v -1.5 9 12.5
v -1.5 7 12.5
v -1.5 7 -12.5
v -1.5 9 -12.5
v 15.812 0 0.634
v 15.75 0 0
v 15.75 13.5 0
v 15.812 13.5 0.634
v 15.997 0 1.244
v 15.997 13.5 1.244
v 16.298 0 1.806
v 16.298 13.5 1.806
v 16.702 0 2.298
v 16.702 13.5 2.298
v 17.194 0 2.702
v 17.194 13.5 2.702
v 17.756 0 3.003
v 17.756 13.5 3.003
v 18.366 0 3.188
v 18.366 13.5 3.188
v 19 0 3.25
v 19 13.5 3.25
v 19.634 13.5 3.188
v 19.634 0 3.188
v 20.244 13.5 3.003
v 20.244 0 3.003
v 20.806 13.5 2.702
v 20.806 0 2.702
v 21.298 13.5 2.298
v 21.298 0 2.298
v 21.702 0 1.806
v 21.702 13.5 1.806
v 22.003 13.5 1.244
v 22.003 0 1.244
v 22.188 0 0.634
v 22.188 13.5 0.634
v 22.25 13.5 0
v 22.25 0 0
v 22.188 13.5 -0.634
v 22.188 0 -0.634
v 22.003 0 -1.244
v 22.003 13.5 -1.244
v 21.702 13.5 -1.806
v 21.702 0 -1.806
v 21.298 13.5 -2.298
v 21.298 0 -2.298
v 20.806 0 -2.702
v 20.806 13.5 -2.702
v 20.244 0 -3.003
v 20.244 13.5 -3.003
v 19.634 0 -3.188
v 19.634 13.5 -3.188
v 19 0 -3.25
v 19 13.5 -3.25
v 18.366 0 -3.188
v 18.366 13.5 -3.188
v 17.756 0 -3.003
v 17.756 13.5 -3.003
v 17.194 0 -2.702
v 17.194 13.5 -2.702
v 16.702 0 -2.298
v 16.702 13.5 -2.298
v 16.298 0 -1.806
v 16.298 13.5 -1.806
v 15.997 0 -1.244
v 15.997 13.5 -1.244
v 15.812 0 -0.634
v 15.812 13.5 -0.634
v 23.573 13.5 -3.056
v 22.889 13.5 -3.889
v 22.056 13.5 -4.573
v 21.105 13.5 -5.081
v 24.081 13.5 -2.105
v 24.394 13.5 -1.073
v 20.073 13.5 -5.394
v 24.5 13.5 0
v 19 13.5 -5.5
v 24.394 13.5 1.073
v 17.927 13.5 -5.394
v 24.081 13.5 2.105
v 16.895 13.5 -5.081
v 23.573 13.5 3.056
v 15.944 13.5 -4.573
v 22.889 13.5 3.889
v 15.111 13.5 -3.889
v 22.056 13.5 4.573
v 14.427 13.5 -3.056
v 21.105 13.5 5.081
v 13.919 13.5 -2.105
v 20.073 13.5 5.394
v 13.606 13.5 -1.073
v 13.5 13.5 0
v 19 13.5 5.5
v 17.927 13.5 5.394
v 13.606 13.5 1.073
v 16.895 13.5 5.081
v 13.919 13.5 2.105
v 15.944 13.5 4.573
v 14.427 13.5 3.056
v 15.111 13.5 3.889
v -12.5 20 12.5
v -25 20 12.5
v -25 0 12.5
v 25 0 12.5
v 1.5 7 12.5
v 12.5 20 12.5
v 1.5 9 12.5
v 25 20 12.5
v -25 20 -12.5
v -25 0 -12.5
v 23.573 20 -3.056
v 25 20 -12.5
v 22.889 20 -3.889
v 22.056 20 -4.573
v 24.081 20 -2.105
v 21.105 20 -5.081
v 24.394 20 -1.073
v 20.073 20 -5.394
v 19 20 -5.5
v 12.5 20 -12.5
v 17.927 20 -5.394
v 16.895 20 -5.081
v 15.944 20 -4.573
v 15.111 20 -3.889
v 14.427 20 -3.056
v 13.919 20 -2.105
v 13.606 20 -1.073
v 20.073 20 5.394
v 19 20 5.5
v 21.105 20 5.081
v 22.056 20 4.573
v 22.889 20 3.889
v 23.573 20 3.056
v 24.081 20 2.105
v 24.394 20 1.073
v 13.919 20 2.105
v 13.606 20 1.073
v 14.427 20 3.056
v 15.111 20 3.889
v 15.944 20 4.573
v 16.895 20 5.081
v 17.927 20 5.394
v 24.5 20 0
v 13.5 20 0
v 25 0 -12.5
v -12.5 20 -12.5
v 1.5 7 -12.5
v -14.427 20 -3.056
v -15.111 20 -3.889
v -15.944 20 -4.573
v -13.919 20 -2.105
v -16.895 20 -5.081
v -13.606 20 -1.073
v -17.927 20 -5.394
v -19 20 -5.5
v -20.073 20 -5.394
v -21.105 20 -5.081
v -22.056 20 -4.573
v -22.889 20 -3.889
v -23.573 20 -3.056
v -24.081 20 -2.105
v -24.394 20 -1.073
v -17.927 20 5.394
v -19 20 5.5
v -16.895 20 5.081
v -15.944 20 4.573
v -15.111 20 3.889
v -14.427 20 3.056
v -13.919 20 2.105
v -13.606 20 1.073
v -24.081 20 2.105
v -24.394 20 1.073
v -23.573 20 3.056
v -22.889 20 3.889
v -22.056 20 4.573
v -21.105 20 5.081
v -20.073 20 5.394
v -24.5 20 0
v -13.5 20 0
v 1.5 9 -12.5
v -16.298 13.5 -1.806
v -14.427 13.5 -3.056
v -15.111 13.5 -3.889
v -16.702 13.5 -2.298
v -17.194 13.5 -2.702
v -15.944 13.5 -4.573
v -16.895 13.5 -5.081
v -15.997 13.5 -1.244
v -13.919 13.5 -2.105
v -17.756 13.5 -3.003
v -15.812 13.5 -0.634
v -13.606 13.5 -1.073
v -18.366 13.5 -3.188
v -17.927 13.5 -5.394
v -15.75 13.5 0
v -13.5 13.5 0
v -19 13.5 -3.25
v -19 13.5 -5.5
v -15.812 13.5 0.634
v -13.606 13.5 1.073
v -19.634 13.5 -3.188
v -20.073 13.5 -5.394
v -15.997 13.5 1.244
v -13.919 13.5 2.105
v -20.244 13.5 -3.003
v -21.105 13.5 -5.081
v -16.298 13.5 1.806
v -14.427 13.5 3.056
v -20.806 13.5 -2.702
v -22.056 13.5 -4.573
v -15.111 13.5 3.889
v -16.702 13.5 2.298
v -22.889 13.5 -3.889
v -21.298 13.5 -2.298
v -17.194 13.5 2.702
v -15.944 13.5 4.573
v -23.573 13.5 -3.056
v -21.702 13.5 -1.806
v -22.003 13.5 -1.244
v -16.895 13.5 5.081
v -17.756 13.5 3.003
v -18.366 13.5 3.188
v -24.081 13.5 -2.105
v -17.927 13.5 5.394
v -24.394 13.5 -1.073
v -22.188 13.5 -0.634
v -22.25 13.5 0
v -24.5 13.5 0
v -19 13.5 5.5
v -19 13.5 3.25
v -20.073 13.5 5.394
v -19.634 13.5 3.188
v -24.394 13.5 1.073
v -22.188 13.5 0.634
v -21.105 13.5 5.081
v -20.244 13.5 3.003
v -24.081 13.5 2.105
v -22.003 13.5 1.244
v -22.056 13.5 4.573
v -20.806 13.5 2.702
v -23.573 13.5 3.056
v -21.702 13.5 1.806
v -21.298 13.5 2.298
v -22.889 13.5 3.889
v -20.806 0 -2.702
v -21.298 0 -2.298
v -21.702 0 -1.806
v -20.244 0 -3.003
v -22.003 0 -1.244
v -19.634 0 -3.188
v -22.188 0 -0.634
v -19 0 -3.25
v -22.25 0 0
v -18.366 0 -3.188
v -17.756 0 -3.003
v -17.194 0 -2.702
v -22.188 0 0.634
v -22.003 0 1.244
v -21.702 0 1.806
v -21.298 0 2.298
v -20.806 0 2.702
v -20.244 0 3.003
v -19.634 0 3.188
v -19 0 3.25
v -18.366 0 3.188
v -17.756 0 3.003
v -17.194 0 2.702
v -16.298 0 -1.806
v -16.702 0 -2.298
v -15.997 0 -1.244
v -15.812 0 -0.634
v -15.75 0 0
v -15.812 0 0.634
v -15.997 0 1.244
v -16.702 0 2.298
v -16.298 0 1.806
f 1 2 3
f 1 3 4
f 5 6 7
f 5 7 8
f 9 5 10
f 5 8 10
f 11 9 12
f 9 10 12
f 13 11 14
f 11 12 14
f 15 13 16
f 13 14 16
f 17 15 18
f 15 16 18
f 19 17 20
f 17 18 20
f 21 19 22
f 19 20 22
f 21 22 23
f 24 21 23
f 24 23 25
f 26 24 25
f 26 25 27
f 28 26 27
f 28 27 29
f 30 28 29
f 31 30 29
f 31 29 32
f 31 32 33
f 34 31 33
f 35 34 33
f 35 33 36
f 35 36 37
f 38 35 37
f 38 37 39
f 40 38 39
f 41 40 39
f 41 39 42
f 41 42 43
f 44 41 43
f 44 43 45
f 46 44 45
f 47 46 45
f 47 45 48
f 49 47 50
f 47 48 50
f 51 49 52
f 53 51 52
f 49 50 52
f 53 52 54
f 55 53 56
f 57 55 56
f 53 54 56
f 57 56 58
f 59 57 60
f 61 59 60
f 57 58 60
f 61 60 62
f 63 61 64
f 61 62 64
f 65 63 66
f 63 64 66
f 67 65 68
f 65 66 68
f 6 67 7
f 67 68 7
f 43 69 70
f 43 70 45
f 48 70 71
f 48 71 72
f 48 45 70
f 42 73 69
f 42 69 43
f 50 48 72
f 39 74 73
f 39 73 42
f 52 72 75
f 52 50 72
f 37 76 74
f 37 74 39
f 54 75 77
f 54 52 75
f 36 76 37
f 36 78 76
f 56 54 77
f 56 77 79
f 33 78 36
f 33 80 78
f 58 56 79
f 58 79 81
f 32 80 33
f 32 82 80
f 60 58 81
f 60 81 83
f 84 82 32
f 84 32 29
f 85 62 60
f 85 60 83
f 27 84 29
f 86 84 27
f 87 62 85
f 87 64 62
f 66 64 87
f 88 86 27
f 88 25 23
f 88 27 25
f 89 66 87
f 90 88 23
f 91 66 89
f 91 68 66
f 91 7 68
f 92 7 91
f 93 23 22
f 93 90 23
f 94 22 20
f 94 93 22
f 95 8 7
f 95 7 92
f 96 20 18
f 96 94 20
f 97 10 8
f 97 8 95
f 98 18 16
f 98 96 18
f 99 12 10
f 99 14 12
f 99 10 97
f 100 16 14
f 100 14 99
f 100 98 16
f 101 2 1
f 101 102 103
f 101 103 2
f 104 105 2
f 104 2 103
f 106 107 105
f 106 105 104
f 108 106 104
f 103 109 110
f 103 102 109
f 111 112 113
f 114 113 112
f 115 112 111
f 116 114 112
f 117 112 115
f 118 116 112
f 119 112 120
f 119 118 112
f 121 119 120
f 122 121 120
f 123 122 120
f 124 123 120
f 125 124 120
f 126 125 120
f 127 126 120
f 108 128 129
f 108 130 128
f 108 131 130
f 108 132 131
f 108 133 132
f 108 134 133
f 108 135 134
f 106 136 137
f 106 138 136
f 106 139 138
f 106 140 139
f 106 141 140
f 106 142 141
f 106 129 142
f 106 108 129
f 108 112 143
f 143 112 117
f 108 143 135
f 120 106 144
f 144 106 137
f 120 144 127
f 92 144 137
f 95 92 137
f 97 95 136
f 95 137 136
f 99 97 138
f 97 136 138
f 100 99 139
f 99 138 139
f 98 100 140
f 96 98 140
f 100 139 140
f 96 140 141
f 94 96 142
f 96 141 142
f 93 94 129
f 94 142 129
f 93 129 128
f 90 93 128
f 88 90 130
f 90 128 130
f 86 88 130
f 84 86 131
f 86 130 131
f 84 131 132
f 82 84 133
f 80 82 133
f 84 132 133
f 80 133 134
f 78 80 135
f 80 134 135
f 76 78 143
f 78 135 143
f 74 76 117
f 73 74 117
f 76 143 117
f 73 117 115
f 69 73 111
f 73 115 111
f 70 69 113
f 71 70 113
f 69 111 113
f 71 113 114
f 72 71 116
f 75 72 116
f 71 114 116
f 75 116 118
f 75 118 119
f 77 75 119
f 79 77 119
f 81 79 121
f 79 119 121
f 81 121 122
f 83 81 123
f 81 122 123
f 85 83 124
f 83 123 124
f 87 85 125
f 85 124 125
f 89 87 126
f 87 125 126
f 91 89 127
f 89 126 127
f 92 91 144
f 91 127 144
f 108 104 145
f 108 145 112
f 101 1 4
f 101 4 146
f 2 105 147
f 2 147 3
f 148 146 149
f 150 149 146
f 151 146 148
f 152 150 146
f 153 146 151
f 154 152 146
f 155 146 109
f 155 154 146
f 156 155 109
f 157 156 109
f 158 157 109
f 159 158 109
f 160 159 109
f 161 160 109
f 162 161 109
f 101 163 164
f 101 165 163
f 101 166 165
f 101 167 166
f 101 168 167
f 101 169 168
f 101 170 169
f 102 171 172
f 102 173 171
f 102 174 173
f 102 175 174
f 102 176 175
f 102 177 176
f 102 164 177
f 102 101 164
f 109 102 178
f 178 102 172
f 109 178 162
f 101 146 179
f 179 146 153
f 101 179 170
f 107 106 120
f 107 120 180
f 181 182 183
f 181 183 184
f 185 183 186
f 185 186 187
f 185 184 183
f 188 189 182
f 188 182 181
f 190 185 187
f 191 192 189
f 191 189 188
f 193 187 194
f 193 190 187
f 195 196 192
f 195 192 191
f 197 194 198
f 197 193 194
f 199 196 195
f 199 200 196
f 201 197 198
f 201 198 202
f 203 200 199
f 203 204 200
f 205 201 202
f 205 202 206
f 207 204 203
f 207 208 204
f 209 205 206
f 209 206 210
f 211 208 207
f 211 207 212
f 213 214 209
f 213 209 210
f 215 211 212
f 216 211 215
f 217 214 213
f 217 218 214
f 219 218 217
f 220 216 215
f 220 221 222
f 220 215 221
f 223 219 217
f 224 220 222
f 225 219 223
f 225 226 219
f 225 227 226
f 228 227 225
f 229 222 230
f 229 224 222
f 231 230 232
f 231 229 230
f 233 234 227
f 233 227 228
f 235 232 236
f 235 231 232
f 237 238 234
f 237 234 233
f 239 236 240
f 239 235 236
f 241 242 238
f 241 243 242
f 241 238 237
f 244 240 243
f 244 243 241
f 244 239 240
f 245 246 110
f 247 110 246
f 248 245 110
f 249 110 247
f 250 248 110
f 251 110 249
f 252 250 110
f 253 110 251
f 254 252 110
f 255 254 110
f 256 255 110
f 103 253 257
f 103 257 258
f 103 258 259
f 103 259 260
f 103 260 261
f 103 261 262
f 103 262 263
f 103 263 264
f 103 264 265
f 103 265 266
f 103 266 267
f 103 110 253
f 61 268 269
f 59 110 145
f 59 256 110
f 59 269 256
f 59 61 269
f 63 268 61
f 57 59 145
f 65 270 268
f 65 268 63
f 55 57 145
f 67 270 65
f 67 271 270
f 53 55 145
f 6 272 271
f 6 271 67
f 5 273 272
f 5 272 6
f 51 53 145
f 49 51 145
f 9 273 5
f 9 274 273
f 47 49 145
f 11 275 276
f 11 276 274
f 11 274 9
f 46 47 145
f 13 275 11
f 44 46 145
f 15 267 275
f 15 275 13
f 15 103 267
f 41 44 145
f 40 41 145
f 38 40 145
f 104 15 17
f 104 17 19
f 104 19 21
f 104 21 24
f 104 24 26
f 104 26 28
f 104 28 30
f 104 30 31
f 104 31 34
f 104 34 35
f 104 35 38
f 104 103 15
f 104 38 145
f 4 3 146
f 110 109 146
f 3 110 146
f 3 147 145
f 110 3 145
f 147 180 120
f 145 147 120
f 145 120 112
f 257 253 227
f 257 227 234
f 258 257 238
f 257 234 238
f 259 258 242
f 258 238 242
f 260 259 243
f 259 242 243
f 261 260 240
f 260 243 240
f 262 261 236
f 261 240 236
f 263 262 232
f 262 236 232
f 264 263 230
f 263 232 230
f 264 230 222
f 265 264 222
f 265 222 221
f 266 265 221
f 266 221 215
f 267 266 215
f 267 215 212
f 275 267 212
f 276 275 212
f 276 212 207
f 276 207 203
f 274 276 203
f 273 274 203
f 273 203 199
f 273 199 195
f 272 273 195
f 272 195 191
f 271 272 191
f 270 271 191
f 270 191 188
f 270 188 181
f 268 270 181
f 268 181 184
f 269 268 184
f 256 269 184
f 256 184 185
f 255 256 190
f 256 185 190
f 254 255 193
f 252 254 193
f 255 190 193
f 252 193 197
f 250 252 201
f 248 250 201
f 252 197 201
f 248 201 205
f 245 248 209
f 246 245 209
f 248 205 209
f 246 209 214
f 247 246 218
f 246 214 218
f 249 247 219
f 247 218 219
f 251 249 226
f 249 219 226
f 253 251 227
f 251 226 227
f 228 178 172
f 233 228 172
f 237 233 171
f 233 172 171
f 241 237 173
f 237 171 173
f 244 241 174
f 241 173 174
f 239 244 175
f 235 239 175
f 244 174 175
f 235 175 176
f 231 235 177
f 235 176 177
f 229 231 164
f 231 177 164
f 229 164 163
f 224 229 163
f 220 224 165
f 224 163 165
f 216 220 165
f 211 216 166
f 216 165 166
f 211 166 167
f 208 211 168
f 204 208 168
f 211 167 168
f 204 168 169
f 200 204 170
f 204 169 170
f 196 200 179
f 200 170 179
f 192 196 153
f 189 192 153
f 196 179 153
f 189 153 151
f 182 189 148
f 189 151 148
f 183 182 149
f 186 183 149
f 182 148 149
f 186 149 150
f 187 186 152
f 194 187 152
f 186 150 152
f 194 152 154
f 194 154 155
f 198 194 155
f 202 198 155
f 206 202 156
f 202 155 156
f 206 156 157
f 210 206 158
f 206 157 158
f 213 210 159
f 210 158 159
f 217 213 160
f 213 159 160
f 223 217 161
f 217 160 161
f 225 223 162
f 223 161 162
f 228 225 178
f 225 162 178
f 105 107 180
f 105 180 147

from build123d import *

# Parameters (mm, degrees)
BOSS_EXTRUDE1_DEPTH      = 12.5
BOSS_EXTRUDE1_DEPTH_BACK = 12.5
SKETCH2_R                = 3.25
CUT_EXTRUDE1_DEPTH       = 35.369317712
SKETCH3_R                = 5.5
CUT_EXTRUDE2_DEPTH       = 6.5


with BuildPart() as part:
    # Sketch1 → Boss-Extrude1 (new, two sides: drawn at the far end of the back side and taken through both)
    with BuildSketch(Plane.XY.offset(-BOSS_EXTRUDE1_DEPTH_BACK)):
        Polygon((-25, 0), (25, 0), (25, 20), (12.5, 20), (1.5, 9), (1.5, 7), (-1.5, 7), (-1.5, 9), (-12.5, 20), (-25, 20), align=None)
    extrude(amount=BOSS_EXTRUDE1_DEPTH + BOSS_EXTRUDE1_DEPTH_BACK)

    # Sketch2 → Cut-Extrude1 (cut, through all)
    with BuildSketch(Plane(origin=(0, 20, 0), x_dir=(-1, 0, 0), z_dir=(0, 1, 0))):
        with Locations((19, 0)):
            Circle(SKETCH2_R)
        with Locations((-19, 0)):
            Circle(SKETCH2_R)
    extrude(amount=-CUT_EXTRUDE1_DEPTH, mode=Mode.SUBTRACT)

    # Sketch3 → Cut-Extrude2 (cut)
    with BuildSketch(Plane(origin=(0, 20, 0), x_dir=(-1, 0, 0), z_dir=(0, 1, 0))):
        with Locations((19, 0)):
            Circle(SKETCH3_R)
        with Locations((-19, 0)):
            Circle(SKETCH3_R)
    extrude(amount=-CUT_EXTRUDE2_DEPTH, mode=Mode.SUBTRACT)


solid = part.part
